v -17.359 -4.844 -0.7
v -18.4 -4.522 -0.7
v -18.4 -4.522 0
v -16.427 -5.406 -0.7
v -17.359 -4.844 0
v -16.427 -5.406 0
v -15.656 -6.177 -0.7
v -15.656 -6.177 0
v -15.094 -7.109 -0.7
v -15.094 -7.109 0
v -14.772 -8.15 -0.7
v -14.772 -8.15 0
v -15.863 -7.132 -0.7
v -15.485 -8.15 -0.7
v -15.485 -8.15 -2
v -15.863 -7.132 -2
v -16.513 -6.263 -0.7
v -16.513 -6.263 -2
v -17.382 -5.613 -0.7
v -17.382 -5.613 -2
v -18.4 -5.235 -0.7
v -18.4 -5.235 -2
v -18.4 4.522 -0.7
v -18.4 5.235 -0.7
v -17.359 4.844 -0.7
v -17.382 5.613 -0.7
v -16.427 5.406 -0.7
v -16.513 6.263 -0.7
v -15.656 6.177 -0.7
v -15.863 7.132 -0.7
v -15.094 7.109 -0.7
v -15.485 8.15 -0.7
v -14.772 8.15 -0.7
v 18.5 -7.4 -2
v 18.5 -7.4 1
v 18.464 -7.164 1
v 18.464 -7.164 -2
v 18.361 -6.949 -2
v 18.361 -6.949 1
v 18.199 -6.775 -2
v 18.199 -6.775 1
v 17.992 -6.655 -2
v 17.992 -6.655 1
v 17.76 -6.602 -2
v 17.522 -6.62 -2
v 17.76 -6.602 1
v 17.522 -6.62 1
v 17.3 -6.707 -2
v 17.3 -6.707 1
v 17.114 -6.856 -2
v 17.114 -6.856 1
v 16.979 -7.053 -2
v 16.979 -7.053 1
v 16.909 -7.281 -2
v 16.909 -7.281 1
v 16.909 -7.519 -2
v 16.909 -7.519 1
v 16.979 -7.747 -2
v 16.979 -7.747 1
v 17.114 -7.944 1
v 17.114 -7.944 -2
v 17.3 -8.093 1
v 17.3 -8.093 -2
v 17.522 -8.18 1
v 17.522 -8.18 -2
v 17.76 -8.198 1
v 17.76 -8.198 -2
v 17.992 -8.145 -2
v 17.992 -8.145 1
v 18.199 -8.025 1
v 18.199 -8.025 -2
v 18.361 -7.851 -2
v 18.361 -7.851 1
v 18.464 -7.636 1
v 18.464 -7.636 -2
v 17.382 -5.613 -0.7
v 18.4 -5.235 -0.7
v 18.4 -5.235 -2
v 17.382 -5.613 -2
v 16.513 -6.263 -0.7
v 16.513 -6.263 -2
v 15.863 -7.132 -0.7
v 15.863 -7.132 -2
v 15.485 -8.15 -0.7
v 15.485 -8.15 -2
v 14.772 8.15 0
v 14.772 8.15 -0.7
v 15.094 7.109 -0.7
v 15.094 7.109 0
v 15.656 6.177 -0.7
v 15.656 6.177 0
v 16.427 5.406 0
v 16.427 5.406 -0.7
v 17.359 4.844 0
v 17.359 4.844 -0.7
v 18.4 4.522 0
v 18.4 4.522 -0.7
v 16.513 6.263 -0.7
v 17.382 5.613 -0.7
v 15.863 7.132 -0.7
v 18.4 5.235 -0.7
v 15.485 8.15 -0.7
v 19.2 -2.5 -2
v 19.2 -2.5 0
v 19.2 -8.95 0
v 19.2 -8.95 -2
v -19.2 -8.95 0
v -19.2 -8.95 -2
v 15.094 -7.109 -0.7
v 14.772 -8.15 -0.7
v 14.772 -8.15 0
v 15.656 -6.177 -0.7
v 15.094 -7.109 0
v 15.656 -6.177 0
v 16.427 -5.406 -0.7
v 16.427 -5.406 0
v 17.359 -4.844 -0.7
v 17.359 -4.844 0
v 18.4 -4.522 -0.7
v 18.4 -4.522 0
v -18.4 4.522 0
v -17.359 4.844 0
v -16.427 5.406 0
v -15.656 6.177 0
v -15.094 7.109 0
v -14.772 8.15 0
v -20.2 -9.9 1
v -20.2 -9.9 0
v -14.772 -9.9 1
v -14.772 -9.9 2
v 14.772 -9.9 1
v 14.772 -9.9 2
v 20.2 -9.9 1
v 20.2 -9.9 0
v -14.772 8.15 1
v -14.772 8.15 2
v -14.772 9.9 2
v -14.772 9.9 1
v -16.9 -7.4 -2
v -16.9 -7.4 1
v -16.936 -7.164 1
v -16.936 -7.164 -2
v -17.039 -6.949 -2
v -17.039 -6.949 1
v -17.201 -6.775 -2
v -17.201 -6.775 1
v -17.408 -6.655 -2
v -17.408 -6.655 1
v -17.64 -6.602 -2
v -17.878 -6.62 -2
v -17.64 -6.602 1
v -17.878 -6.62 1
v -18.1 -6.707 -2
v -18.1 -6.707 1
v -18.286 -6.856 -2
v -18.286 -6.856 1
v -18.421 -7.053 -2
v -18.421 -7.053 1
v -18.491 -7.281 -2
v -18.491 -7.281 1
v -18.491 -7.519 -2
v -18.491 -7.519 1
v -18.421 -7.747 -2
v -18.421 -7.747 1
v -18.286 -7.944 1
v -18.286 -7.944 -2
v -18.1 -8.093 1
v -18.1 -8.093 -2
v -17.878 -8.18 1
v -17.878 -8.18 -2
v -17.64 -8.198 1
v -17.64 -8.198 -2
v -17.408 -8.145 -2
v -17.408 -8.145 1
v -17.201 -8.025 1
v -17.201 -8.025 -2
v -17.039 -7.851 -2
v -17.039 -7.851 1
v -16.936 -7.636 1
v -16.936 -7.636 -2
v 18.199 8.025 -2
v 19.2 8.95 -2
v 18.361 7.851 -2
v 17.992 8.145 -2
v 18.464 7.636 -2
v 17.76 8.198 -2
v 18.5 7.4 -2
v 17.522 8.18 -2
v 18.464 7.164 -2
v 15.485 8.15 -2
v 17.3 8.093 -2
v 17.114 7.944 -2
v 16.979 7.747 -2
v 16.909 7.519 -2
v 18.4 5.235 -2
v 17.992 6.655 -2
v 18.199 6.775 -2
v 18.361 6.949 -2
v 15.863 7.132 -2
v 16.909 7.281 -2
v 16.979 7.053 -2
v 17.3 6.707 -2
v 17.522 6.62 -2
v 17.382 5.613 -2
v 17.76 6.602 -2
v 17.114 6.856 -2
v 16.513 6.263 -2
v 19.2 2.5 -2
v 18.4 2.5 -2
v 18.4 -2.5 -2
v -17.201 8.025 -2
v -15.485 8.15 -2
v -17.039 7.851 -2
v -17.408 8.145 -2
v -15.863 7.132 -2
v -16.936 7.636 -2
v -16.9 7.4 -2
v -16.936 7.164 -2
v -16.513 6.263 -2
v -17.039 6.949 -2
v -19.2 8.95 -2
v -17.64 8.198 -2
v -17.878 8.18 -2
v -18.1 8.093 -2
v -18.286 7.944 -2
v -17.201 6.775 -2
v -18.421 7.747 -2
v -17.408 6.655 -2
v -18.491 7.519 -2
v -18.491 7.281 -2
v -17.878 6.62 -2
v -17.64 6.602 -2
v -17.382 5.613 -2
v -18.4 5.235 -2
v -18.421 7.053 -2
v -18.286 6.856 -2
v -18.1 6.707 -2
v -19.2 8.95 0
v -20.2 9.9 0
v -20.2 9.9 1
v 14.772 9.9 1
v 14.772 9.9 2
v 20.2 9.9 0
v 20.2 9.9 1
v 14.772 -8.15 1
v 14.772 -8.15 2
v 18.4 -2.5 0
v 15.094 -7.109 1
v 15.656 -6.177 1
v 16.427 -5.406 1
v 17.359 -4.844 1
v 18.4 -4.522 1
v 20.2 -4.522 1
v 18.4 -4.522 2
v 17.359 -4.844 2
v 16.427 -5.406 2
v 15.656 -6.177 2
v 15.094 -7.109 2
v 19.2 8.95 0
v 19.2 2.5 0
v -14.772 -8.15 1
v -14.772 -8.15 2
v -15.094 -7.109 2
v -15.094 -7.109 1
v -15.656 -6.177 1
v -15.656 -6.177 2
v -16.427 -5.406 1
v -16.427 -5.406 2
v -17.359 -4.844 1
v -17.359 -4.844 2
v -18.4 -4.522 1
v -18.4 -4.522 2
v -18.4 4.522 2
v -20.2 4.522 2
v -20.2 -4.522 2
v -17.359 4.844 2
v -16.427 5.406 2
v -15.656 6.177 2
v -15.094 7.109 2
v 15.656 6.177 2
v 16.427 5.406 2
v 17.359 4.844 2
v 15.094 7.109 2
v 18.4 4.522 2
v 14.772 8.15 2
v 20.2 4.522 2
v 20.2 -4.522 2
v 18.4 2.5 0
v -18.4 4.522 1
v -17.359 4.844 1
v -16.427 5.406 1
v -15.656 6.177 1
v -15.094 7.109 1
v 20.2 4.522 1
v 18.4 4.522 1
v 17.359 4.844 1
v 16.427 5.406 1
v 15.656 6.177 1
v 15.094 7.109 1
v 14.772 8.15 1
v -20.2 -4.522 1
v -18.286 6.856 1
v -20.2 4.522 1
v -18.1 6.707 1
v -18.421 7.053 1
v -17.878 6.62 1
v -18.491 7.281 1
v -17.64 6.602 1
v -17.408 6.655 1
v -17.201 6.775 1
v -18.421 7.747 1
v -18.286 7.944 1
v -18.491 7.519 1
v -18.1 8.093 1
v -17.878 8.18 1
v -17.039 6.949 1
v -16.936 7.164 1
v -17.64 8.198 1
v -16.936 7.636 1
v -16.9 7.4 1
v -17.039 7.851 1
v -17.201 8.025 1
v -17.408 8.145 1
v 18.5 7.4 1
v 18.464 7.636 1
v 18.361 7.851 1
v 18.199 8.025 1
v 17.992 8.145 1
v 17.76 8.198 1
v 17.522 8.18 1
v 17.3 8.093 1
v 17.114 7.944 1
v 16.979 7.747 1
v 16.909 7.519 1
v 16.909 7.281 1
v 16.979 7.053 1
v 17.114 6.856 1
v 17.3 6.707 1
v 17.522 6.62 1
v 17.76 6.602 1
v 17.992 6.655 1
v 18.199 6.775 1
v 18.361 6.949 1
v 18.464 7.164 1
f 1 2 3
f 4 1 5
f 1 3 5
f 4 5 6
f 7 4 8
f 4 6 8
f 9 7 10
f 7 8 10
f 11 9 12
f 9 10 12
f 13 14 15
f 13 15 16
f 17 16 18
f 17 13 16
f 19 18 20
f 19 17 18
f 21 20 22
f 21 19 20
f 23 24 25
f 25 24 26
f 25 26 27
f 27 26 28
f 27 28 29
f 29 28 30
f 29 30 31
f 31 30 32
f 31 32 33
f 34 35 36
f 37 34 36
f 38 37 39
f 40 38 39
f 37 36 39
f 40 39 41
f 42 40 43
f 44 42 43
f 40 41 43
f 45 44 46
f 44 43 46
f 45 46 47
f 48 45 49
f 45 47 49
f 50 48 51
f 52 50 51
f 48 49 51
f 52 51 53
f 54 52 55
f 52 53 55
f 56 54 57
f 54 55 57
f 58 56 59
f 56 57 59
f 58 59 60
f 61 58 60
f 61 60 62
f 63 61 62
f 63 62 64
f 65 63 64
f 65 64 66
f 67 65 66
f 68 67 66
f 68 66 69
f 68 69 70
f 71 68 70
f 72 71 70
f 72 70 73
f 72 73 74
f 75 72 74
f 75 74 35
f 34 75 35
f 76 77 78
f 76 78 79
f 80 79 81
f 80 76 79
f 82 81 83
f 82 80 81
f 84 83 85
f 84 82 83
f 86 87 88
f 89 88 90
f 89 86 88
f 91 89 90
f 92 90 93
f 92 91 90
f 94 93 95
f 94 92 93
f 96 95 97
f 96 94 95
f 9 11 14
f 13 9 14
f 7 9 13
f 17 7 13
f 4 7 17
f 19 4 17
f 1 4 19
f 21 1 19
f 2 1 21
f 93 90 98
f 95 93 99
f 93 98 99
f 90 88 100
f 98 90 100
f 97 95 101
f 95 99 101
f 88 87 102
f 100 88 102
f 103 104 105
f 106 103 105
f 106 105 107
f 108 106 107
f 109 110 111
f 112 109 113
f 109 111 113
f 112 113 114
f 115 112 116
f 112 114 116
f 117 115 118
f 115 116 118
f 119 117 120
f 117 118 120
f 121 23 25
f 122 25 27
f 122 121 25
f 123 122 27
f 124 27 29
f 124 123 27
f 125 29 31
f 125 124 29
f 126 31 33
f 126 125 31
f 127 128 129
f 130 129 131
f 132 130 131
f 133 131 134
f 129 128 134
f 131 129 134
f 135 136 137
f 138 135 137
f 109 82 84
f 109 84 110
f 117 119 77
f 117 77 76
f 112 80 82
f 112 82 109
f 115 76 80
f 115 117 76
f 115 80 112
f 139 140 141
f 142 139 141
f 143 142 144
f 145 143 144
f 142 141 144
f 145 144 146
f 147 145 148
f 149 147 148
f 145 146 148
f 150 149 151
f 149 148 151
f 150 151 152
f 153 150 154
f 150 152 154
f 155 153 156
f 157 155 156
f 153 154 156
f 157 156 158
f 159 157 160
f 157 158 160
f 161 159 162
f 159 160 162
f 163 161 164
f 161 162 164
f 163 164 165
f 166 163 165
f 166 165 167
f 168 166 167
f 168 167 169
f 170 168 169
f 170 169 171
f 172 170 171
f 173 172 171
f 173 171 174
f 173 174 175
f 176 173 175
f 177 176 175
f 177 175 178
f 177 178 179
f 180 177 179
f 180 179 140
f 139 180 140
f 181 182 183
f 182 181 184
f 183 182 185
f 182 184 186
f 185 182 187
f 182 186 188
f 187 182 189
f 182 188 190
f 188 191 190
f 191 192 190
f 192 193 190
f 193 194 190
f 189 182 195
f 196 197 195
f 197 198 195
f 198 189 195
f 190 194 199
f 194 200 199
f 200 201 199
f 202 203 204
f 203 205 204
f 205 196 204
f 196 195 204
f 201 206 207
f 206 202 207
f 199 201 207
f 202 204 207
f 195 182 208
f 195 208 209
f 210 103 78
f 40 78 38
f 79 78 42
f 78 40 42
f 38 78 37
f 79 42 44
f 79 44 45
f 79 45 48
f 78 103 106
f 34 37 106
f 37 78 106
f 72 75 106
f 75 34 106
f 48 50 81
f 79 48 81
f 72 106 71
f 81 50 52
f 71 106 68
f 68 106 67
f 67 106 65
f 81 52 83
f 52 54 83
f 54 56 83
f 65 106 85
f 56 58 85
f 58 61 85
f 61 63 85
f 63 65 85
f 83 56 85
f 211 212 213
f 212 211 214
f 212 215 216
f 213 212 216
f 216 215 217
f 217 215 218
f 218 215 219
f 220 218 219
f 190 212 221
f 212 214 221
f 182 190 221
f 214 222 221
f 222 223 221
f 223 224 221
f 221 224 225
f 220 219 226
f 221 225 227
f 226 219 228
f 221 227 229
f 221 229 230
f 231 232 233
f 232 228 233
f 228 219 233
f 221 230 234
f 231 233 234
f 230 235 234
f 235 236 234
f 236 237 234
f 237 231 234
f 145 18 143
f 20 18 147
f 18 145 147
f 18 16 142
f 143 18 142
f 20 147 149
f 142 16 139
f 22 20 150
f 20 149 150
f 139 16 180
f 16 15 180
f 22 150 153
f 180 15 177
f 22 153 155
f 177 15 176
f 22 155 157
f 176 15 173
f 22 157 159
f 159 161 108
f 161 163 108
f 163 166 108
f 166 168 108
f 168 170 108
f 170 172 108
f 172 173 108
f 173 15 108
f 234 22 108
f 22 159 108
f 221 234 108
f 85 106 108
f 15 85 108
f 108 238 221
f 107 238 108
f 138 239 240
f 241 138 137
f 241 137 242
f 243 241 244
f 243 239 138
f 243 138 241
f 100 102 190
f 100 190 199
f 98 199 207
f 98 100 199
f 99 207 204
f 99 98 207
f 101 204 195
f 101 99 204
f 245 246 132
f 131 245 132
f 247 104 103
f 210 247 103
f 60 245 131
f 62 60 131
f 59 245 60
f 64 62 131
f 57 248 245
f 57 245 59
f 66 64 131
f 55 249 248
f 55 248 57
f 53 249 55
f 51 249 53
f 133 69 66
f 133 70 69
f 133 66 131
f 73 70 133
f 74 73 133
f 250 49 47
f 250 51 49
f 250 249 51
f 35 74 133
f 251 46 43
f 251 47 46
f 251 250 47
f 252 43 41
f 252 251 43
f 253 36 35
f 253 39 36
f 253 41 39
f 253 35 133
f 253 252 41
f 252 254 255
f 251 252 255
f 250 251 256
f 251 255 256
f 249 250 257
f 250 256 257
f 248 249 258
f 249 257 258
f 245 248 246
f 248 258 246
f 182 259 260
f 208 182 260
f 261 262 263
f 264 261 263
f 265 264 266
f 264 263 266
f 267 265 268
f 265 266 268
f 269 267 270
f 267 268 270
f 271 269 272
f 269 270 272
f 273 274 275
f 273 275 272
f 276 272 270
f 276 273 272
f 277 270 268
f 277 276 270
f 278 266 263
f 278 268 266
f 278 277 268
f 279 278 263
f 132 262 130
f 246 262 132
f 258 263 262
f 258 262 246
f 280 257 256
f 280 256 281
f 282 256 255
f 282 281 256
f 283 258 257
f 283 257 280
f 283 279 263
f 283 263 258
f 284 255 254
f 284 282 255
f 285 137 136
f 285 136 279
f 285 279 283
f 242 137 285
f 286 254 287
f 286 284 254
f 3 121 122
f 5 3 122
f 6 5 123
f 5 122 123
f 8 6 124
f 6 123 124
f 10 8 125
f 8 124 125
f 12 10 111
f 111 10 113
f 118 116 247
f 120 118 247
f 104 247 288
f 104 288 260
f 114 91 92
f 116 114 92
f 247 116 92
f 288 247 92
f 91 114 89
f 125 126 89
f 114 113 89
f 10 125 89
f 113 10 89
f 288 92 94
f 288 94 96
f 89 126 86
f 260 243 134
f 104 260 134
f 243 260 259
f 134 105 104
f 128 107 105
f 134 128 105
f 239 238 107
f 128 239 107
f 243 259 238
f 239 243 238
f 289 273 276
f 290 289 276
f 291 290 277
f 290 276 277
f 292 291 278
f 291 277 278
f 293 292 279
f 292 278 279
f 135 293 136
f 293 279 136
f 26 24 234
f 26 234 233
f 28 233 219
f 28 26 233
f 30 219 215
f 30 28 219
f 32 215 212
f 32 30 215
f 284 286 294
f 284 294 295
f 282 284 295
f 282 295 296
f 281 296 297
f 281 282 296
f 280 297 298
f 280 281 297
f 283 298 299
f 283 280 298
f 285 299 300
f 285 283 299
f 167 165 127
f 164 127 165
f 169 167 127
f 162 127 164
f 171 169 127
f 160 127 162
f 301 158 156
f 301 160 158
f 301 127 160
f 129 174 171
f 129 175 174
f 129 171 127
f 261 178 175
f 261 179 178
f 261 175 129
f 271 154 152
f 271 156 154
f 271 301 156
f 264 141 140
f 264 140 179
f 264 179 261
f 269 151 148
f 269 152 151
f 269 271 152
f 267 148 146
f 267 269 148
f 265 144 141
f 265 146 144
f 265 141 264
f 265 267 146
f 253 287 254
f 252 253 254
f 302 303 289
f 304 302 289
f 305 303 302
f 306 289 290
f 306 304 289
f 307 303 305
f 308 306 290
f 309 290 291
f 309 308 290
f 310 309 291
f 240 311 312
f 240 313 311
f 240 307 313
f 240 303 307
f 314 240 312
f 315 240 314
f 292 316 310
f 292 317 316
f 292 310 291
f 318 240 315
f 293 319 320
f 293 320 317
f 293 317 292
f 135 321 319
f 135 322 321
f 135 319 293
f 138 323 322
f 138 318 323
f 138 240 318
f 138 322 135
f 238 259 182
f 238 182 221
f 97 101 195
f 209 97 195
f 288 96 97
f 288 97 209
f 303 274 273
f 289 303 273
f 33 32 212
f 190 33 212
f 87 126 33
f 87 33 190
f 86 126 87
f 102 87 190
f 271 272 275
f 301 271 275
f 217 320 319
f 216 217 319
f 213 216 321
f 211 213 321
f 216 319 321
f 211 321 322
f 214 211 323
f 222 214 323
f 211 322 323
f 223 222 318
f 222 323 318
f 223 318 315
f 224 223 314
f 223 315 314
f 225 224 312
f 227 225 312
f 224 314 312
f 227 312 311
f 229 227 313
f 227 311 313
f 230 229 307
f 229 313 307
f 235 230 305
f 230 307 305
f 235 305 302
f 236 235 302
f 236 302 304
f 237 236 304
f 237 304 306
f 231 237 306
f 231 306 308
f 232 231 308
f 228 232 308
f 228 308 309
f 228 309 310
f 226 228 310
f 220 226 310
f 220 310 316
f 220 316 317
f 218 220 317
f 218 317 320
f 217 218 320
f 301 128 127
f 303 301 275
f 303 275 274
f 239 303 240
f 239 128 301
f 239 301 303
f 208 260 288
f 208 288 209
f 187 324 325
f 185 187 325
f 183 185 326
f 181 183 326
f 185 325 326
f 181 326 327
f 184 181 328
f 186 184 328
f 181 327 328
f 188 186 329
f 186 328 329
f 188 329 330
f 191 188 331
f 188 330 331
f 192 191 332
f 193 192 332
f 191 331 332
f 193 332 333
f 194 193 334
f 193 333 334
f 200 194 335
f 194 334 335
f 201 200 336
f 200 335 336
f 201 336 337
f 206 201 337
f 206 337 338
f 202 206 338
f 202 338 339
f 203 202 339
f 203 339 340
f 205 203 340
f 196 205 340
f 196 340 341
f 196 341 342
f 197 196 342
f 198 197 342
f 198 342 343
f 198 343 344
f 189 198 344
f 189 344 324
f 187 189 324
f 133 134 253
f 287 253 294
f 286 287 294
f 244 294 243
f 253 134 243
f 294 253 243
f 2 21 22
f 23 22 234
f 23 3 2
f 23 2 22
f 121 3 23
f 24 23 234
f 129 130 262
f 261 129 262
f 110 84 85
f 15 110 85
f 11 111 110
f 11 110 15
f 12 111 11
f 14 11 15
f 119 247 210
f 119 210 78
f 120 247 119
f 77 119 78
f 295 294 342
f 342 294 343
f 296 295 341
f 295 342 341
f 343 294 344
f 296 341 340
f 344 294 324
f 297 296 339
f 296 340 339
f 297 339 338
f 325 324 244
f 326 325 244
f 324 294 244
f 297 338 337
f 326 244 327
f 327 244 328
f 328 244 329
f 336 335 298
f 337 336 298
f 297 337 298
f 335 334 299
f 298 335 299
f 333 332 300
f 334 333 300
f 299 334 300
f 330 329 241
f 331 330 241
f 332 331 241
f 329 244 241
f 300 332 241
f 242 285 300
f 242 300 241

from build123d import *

# Parameters (mm, degrees)
SKETCH_1_W          = 40.4
SKETCH_1_H          = 19.8
EXTRUDE_1_DEPTH     = 2
SKETCH_2_W          = 38.4
SKETCH_2_H          = 17.9
EXTRUDE_2_DEPTH     = 2
CUT_EXTRUDE_6_DEPTH = 1
EXTRUDE_7_DEPTH     = 0.7
SKETCH_4_R          = 0.8
CUT_EXTRUDE_4_DEPTH = 23.848413512
SKETCH_8_W          = 2
SKETCH_8_H          = 5
CUT_EXTRUDE_8_DEPTH = 1.8


with BuildPart() as part:
    # 草圖1 → 伸長1 (new body)
    with BuildSketch(Plane.XY):
        Rectangle(SKETCH_1_W, SKETCH_1_H)
    extrude(amount=EXTRUDE_1_DEPTH)

    # 草圖2 → 伸長2 (add)
    with BuildSketch(Plane(origin=(0, 0, 0), x_dir=(-1, 0, 0), z_dir=(0, 0, 1))):
        Rectangle(SKETCH_2_W, SKETCH_2_H)
        with BuildLine():
            Line((-15.485164876, 8.15), (15.485164876, 8.15))
            ThreePointArc((15.485164876, 8.15), (16.512994231, 6.262994231), (18.4, 5.235164876))
            Line((18.4, 5.235164876), (18.4, -5.235164876))
            ThreePointArc((18.4, -5.235164876), (16.512994231, -6.262994231), (15.485164876, -8.15))
            Line((15.485164876, -8.15), (-15.485164876, -8.15))
            ThreePointArc((-15.485164876, -8.15), (-16.512994231, -6.262994231), (-18.4, -5.235164876))
            Line((-18.4, -5.235164876), (-18.4, 5.235164876))
            ThreePointArc((-18.4, 5.235164876), (-16.512994231, 6.262994231), (-15.485164876, 8.15))
        make_face(mode=Mode.SUBTRACT)
    extrude(amount=-EXTRUDE_2_DEPTH)

    # 草圖5 → 伸長6 (cut)
    with BuildSketch(Plane.XY.offset(2)):
        with BuildLine():
            Line((14.771682035, 8.15), (14.771682035, 9.9))
            Line((14.771682035, 9.9), (20.2, 9.9))
            Line((20.2, 9.9), (20.2, 4.521682035))
            Line((20.2, 4.521682035), (18.4, 4.521682035))
            ThreePointArc((18.4, 4.521682035), (16.018019485, 5.768019485), (14.771682035, 8.15))
        make_face()
        with BuildLine():
            Line((-14.771682035, 8.15), (-14.771682035, 9.9))
            Line((-14.771682035, 9.9), (-20.2, 9.9))
            Line((-20.2, 9.9), (-20.2, 4.521682035))
            Line((-20.2, 4.521682035), (-18.4, 4.521682035))
            ThreePointArc((-18.4, 4.521682035), (-16.018019485, 5.768019485), (-14.771682035, 8.15))
        make_face()
        with BuildLine():
            Line((-18.4, -4.521682035), (-20.2, -4.521682035))
            Line((-20.2, -4.521682035), (-20.2, -9.9))
            Line((-20.2, -9.9), (-14.771682035, -9.9))
            Line((-14.771682035, -9.9), (-14.771682035, -8.15))
            ThreePointArc((-14.771682035, -8.15), (-16.018019485, -5.768019485), (-18.4, -4.521682035))
        make_face()
        with BuildLine():
            Line((14.771682035, -8.15), (14.771682035, -9.9))
            Line((14.771682035, -9.9), (20.2, -9.9))
            Line((20.2, -9.9), (20.2, -4.521682035))
            Line((20.2, -4.521682035), (18.4, -4.521682035))
            ThreePointArc((18.4, -4.521682035), (16.018019485, -5.768019485), (14.771682035, -8.15))
        make_face()
    extrude(amount=-CUT_EXTRUDE_6_DEPTH, mode=Mode.SUBTRACT)

    # 草圖6 → 伸長7 (add)
    with BuildSketch(Plane(origin=(0, 0, 0), x_dir=(-1, 0, 0), z_dir=(0, 0, -1))):
        with BuildLine():
            Line((-19.2, -4.45), (-19.2, -8.95))
            Line((-19.2, -8.95), (-14.7, -8.95))
            ThreePointArc((-14.7, -8.95), (-16.018019485, -5.768019485), (-19.2, -4.45))
        make_face()
        with BuildLine():
            Line((-19.2, 8.95), (-14.7, 8.95))
            ThreePointArc((-14.7, 8.95), (-16.018019485, 5.768019485), (-19.2, 4.45))
            Line((-19.2, 4.45), (-19.2, 8.95))
        make_face()
        with BuildLine():
            Line((19.2, 8.95), (19.2, 4.45))
            ThreePointArc((19.2, 4.45), (16.018019485, 5.768019485), (14.7, 8.95))
            Line((14.7, 8.95), (19.2, 8.95))
        make_face()
        with BuildLine():
            Line((14.7, -8.95), (19.2, -8.95))
            Line((19.2, -8.95), (19.2, -4.45))
            ThreePointArc((19.2, -4.45), (16.018019485, -5.768019485), (14.7, -8.95))
        make_face()
    extrude(amount=EXTRUDE_7_DEPTH)

    # 草圖4 → 伸長4 (cut, through all)
    with BuildSketch(Plane(origin=(0, 0, 2), x_dir=(-1, 0, 0), z_dir=(0, 0, 1))):
        with Locations(Location((-17.7, 7.4, 0), (0, 0, 180))):
            Circle(SKETCH_4_R)
        with Locations(Location((17.7, 7.4, 0), (0, 0, 180))):
            Circle(SKETCH_4_R)
        with Locations(Location((17.7, -7.4, 0), (0, 0, 180))):
            Circle(SKETCH_4_R)
        with Locations(Location((-17.7, -7.4, 0), (0, 0, 180))):
            Circle(SKETCH_4_R)
    extrude(amount=-CUT_EXTRUDE_4_DEPTH, mode=Mode.SUBTRACT)

    # 草圖8 → 伸長8 (cut)
    with BuildSketch(Plane(origin=(20.2, 0, 0), x_dir=(0, 0, -1), z_dir=(1, 0, 0))):
        with Locations((1, 0)):
            Rectangle(SKETCH_8_W, SKETCH_8_H)
    extrude(amount=-CUT_EXTRUDE_8_DEPTH, mode=Mode.SUBTRACT)


solid = part.part
